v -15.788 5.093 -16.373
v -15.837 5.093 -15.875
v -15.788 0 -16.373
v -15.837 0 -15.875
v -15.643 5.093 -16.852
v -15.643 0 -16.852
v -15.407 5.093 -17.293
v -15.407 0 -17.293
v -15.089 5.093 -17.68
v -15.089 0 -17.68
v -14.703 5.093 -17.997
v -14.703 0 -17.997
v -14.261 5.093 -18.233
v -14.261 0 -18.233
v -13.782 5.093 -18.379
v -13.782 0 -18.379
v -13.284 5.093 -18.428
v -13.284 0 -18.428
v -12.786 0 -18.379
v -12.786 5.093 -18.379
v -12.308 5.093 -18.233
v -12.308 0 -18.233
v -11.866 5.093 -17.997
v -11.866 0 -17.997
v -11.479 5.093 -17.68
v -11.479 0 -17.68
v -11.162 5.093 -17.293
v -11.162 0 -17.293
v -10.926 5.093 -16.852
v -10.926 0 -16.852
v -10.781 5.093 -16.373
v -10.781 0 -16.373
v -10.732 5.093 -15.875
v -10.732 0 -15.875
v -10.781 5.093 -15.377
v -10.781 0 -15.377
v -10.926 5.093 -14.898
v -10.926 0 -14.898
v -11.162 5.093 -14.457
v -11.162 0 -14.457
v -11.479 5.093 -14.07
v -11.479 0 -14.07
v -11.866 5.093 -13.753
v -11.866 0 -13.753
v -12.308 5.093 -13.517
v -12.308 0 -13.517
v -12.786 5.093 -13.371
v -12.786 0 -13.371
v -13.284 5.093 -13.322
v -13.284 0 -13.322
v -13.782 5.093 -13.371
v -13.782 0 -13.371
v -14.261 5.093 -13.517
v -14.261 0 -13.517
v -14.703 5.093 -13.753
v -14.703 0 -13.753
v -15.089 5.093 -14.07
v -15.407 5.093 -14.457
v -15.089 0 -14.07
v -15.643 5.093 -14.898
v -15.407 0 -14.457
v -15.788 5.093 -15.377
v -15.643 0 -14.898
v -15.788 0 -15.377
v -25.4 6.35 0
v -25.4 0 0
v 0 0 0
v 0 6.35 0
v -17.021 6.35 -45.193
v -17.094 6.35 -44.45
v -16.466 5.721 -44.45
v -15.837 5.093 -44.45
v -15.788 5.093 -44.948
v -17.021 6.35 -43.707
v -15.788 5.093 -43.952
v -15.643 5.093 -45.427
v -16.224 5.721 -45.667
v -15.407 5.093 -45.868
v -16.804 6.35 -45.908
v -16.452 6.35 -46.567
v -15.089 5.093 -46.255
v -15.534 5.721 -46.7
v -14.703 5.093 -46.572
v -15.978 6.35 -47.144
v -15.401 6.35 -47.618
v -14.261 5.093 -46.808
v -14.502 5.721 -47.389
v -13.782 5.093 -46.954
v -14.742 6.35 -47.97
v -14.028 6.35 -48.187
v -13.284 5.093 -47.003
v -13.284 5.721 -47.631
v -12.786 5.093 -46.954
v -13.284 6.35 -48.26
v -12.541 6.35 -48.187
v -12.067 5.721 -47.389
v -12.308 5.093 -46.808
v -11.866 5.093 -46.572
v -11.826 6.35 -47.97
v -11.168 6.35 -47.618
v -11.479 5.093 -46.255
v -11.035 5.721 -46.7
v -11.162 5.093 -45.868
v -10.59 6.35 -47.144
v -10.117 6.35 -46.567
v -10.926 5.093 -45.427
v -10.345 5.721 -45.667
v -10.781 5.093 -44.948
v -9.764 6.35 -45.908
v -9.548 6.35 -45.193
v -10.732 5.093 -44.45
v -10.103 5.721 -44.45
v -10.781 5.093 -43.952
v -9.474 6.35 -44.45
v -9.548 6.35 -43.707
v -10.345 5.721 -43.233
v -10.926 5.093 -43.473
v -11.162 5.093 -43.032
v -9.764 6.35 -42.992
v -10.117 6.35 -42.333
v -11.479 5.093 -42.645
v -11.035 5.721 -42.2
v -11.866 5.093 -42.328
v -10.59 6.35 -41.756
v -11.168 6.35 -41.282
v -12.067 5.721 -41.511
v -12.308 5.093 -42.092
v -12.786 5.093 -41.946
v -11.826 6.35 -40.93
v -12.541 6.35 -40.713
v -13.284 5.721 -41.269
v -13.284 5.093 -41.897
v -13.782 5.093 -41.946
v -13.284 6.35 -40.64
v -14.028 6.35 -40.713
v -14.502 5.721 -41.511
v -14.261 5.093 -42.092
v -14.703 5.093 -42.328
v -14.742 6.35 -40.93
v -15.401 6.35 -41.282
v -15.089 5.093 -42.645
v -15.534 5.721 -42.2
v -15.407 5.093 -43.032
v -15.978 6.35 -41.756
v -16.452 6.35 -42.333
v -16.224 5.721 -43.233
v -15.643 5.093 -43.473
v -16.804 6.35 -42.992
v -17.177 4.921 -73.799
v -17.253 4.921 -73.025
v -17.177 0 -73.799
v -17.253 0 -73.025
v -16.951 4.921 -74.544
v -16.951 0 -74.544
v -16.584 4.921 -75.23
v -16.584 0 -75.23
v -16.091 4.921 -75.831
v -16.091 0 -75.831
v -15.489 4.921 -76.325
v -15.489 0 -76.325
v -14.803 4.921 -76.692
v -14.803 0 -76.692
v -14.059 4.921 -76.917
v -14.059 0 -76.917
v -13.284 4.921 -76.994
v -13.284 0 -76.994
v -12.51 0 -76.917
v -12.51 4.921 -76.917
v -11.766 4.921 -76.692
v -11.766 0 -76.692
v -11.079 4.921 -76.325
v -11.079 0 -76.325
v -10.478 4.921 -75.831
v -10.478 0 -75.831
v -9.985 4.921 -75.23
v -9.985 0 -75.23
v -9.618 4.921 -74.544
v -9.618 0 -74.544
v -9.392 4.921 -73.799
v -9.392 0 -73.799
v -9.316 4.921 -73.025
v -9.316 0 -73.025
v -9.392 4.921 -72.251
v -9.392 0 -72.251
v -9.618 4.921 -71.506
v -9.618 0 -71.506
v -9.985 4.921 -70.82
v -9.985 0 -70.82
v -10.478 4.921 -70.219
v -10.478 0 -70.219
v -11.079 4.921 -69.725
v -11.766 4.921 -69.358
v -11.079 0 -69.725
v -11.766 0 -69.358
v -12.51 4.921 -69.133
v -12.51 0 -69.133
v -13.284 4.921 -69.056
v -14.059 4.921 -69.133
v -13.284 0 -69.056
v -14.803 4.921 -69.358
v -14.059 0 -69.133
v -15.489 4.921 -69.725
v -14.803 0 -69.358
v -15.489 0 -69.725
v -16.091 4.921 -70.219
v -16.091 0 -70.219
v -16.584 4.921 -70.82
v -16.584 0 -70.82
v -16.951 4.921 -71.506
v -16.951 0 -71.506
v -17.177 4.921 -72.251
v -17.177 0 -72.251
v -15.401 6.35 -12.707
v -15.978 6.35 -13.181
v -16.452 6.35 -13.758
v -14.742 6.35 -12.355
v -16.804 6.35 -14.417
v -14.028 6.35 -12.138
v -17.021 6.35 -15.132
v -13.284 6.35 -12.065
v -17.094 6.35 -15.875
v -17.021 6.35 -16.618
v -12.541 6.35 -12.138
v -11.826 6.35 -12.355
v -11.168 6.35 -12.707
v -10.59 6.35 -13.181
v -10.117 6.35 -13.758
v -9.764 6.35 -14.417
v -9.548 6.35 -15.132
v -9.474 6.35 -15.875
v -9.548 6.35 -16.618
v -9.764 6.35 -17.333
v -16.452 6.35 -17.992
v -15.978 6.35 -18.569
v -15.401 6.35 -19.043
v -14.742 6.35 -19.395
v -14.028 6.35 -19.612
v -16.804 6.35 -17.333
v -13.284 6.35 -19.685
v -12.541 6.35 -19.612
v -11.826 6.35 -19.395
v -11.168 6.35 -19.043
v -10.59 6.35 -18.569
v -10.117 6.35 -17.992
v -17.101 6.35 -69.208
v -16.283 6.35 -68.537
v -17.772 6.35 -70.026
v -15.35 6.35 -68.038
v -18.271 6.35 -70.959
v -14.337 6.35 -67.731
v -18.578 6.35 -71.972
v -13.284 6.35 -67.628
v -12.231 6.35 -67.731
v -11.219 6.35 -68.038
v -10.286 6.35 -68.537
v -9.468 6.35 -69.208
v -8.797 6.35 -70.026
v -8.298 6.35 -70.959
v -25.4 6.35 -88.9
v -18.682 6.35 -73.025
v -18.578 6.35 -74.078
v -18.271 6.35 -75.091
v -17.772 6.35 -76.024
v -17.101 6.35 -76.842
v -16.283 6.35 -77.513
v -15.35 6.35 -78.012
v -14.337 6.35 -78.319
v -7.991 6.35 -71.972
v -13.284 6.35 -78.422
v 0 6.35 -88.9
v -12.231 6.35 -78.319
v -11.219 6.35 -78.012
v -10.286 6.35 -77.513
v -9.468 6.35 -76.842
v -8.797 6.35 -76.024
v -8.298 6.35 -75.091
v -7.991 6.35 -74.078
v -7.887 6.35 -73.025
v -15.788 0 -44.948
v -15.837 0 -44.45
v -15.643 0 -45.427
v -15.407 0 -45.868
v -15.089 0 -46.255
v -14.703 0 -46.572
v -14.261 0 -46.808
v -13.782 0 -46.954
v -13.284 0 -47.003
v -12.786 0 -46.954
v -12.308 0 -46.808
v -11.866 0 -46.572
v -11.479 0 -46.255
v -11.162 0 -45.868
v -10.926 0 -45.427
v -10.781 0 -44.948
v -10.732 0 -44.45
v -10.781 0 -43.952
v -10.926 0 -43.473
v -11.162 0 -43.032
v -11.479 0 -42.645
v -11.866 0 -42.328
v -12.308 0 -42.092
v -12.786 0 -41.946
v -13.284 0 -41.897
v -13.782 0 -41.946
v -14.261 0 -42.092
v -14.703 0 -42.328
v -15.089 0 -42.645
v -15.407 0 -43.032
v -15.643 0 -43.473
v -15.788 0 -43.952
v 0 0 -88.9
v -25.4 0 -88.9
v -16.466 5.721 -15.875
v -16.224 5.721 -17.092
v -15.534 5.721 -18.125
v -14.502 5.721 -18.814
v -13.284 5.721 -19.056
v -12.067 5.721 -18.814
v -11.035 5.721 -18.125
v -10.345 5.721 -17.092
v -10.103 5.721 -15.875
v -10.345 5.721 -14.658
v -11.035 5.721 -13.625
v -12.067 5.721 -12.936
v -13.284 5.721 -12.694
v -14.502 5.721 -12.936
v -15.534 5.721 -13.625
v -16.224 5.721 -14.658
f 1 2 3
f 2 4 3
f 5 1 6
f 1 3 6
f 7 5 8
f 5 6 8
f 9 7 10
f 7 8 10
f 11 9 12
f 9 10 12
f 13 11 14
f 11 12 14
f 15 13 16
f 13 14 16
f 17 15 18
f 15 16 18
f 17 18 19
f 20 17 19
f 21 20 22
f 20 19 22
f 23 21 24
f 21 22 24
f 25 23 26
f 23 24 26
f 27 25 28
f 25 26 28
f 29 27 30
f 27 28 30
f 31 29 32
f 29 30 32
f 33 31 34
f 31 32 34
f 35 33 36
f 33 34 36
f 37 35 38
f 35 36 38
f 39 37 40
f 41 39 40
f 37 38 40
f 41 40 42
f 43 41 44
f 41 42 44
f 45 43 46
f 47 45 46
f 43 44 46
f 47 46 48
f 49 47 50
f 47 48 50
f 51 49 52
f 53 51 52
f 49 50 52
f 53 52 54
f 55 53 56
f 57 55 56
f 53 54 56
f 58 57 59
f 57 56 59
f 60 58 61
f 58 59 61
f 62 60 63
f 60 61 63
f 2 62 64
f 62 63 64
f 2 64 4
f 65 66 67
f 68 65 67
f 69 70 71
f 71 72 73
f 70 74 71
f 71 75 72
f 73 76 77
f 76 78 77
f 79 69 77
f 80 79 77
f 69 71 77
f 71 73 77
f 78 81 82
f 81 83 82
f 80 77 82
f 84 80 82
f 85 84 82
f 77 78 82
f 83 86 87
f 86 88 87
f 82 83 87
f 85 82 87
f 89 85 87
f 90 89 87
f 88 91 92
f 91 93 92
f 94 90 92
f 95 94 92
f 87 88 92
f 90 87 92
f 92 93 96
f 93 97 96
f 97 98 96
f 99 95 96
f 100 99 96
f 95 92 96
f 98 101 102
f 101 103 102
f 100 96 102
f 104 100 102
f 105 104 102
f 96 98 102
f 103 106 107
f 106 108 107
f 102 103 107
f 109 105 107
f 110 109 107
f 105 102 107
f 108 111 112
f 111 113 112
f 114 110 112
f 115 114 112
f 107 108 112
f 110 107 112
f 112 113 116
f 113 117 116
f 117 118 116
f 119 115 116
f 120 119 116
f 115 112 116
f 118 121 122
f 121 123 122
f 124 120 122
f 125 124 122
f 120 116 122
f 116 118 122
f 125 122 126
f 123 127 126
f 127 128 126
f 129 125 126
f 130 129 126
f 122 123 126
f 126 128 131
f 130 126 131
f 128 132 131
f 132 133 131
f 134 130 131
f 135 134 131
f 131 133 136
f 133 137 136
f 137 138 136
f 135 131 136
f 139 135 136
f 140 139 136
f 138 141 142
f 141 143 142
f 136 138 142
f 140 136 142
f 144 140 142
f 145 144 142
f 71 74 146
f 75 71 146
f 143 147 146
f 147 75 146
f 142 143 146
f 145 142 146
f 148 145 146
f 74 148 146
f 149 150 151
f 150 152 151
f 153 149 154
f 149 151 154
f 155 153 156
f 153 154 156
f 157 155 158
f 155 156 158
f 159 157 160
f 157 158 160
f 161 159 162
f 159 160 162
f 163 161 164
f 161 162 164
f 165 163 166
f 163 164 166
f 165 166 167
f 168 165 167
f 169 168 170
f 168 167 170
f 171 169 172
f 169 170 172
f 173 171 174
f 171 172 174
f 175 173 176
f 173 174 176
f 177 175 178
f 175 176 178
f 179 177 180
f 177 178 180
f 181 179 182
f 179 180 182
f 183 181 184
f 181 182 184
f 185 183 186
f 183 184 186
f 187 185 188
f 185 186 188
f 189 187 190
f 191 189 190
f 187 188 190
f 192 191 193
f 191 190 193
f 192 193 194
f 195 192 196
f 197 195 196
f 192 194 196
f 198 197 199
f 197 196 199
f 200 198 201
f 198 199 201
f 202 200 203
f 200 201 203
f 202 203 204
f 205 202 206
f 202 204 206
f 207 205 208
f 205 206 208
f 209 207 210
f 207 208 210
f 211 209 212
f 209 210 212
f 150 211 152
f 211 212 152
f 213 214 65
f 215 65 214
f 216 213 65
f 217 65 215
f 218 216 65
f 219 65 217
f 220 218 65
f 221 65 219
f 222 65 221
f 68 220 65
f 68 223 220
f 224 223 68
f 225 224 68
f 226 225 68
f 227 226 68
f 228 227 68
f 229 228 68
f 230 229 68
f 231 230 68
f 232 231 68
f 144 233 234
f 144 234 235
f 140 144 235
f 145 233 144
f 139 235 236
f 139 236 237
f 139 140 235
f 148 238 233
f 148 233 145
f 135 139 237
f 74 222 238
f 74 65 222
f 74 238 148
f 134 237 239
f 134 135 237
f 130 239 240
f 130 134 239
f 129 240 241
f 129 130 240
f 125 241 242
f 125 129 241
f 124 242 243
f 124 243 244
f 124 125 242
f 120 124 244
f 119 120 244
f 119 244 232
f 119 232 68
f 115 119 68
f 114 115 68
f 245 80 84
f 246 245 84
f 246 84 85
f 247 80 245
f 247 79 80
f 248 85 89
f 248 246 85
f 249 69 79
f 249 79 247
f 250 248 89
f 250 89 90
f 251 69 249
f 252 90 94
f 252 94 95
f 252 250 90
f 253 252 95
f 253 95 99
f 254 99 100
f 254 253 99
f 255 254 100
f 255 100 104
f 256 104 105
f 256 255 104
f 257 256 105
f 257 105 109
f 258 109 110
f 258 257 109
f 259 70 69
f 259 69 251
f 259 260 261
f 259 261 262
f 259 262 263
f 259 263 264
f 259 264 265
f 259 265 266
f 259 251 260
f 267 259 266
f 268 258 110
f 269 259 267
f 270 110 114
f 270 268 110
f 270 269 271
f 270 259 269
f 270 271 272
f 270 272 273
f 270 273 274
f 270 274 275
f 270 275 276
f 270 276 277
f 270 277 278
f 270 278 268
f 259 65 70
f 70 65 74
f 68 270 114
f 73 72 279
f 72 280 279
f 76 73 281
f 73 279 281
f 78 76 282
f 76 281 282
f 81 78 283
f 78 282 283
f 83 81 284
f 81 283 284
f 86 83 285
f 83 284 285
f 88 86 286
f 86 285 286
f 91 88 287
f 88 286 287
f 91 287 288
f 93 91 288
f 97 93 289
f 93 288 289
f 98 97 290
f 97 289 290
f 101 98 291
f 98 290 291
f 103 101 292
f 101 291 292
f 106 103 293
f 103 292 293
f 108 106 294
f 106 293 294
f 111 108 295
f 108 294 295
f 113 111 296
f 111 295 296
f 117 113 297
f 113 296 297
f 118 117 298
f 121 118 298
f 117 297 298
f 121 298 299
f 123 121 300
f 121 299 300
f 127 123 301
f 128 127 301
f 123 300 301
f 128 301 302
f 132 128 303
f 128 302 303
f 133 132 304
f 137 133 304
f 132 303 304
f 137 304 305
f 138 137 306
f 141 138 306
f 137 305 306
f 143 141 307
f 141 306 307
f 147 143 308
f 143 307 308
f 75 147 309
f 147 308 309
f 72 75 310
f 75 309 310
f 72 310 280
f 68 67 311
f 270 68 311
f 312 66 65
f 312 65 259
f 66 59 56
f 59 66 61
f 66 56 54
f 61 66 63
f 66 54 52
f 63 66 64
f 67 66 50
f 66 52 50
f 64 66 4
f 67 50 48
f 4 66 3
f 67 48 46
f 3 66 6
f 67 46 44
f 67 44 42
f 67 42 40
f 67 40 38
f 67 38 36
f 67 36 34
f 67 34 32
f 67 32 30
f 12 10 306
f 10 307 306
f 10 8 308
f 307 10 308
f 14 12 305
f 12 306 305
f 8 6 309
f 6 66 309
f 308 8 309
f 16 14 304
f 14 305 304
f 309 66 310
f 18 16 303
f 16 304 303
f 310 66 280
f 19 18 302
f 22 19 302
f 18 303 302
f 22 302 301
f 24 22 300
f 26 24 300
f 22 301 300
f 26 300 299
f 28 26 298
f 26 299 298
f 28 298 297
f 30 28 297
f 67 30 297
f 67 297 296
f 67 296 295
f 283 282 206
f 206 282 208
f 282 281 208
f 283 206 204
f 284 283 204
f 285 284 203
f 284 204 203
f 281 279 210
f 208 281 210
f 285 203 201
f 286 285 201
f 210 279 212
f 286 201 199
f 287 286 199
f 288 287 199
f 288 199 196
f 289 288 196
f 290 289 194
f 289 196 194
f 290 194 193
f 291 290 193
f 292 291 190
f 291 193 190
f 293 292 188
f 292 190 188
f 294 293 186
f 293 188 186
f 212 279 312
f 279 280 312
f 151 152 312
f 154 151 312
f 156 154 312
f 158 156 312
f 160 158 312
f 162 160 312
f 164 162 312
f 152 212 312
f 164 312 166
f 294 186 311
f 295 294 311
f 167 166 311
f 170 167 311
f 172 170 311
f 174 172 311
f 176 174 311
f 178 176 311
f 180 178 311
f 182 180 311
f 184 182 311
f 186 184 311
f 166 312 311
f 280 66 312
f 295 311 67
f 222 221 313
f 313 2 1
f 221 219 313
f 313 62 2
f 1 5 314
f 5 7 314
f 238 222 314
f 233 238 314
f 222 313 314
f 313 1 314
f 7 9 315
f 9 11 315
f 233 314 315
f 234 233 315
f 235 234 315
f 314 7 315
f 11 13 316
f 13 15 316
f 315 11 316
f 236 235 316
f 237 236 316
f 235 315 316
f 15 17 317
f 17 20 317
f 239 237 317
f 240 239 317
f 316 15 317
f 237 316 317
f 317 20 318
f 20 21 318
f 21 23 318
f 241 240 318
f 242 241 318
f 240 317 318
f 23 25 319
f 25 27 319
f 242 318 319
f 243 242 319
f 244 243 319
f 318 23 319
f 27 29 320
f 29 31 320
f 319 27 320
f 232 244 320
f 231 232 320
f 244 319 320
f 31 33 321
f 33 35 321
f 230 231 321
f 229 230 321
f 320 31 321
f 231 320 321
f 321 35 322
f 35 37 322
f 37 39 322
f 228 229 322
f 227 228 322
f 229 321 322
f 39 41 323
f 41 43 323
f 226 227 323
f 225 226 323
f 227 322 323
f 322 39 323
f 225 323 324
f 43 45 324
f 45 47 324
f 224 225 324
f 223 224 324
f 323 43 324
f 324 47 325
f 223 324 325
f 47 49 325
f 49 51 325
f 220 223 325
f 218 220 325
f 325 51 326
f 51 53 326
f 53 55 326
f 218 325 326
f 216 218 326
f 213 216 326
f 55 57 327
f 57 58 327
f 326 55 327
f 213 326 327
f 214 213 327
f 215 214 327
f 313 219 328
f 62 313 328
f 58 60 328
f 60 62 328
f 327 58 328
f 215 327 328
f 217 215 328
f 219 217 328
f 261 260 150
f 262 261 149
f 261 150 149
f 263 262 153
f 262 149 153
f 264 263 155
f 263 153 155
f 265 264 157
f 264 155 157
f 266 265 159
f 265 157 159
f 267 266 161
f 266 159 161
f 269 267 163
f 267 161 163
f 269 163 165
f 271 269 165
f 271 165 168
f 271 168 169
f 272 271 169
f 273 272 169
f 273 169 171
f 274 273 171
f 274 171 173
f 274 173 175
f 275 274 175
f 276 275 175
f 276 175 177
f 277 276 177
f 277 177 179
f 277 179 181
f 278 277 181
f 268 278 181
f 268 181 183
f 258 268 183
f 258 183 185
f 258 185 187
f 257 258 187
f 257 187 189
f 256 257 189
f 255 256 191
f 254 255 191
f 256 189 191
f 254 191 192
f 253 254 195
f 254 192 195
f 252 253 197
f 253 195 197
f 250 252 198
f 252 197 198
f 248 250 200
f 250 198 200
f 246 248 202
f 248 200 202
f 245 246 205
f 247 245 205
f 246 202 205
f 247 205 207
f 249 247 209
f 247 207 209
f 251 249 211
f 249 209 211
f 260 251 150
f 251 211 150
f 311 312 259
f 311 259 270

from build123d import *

# Parameters (mm, degrees)
SKETCH1_W                         = 25.4
SKETCH1_H                         = 88.9
BOSS_EXTRUDE1_DEPTH               = 6.35
F_1_4_20_TAPPED_HOLE1_D           = 5.1054
F_1_4_20_TAPPED_HOLE1_CSINK_D     = 7.62
F_1_4_20_TAPPED_HOLE1_CSINK_ANGLE = 90
F_3_8_16_TAPPED_HOLE1_D           = 7.9375
F_3_8_16_TAPPED_HOLE1_CSINK_D     = 10.795
F_3_8_16_TAPPED_HOLE1_CSINK_ANGLE = 90


with BuildPart() as part:
    # Sketch1 → Boss-Extrude1 (new body)
    with BuildSketch(Plane(origin=(0, 0, 0), x_dir=(1, 0, 0), z_dir=(0, 1, 0))):
        with Locations((-12.7, 44.45)):
            Rectangle(SKETCH1_W, SKETCH1_H)
    extrude(amount=BOSS_EXTRUDE1_DEPTH)

    # 1/4-20 Tapped Hole1 (through all)
    with Locations(Plane(origin=(0, 6.35, 0), x_dir=(1, 0, 0), z_dir=(0, 1, 0))):
        with Locations((-13.284419072, 15.875), (-13.284419072, 44.45)):
            CounterSinkHole(F_1_4_20_TAPPED_HOLE1_D / 2, F_1_4_20_TAPPED_HOLE1_CSINK_D / 2, counter_sink_angle=F_1_4_20_TAPPED_HOLE1_CSINK_ANGLE)

    # 3/8-16 Tapped Hole1 (through all)
    with Locations(Plane(origin=(0, 6.35, 0), x_dir=(1, 0, 0), z_dir=(0, 1, 0))):
        with Locations((-13.284419072, 73.025)):
            CounterSinkHole(F_3_8_16_TAPPED_HOLE1_D / 2, F_3_8_16_TAPPED_HOLE1_CSINK_D / 2, counter_sink_angle=F_3_8_16_TAPPED_HOLE1_CSINK_ANGLE)


solid = part.part
